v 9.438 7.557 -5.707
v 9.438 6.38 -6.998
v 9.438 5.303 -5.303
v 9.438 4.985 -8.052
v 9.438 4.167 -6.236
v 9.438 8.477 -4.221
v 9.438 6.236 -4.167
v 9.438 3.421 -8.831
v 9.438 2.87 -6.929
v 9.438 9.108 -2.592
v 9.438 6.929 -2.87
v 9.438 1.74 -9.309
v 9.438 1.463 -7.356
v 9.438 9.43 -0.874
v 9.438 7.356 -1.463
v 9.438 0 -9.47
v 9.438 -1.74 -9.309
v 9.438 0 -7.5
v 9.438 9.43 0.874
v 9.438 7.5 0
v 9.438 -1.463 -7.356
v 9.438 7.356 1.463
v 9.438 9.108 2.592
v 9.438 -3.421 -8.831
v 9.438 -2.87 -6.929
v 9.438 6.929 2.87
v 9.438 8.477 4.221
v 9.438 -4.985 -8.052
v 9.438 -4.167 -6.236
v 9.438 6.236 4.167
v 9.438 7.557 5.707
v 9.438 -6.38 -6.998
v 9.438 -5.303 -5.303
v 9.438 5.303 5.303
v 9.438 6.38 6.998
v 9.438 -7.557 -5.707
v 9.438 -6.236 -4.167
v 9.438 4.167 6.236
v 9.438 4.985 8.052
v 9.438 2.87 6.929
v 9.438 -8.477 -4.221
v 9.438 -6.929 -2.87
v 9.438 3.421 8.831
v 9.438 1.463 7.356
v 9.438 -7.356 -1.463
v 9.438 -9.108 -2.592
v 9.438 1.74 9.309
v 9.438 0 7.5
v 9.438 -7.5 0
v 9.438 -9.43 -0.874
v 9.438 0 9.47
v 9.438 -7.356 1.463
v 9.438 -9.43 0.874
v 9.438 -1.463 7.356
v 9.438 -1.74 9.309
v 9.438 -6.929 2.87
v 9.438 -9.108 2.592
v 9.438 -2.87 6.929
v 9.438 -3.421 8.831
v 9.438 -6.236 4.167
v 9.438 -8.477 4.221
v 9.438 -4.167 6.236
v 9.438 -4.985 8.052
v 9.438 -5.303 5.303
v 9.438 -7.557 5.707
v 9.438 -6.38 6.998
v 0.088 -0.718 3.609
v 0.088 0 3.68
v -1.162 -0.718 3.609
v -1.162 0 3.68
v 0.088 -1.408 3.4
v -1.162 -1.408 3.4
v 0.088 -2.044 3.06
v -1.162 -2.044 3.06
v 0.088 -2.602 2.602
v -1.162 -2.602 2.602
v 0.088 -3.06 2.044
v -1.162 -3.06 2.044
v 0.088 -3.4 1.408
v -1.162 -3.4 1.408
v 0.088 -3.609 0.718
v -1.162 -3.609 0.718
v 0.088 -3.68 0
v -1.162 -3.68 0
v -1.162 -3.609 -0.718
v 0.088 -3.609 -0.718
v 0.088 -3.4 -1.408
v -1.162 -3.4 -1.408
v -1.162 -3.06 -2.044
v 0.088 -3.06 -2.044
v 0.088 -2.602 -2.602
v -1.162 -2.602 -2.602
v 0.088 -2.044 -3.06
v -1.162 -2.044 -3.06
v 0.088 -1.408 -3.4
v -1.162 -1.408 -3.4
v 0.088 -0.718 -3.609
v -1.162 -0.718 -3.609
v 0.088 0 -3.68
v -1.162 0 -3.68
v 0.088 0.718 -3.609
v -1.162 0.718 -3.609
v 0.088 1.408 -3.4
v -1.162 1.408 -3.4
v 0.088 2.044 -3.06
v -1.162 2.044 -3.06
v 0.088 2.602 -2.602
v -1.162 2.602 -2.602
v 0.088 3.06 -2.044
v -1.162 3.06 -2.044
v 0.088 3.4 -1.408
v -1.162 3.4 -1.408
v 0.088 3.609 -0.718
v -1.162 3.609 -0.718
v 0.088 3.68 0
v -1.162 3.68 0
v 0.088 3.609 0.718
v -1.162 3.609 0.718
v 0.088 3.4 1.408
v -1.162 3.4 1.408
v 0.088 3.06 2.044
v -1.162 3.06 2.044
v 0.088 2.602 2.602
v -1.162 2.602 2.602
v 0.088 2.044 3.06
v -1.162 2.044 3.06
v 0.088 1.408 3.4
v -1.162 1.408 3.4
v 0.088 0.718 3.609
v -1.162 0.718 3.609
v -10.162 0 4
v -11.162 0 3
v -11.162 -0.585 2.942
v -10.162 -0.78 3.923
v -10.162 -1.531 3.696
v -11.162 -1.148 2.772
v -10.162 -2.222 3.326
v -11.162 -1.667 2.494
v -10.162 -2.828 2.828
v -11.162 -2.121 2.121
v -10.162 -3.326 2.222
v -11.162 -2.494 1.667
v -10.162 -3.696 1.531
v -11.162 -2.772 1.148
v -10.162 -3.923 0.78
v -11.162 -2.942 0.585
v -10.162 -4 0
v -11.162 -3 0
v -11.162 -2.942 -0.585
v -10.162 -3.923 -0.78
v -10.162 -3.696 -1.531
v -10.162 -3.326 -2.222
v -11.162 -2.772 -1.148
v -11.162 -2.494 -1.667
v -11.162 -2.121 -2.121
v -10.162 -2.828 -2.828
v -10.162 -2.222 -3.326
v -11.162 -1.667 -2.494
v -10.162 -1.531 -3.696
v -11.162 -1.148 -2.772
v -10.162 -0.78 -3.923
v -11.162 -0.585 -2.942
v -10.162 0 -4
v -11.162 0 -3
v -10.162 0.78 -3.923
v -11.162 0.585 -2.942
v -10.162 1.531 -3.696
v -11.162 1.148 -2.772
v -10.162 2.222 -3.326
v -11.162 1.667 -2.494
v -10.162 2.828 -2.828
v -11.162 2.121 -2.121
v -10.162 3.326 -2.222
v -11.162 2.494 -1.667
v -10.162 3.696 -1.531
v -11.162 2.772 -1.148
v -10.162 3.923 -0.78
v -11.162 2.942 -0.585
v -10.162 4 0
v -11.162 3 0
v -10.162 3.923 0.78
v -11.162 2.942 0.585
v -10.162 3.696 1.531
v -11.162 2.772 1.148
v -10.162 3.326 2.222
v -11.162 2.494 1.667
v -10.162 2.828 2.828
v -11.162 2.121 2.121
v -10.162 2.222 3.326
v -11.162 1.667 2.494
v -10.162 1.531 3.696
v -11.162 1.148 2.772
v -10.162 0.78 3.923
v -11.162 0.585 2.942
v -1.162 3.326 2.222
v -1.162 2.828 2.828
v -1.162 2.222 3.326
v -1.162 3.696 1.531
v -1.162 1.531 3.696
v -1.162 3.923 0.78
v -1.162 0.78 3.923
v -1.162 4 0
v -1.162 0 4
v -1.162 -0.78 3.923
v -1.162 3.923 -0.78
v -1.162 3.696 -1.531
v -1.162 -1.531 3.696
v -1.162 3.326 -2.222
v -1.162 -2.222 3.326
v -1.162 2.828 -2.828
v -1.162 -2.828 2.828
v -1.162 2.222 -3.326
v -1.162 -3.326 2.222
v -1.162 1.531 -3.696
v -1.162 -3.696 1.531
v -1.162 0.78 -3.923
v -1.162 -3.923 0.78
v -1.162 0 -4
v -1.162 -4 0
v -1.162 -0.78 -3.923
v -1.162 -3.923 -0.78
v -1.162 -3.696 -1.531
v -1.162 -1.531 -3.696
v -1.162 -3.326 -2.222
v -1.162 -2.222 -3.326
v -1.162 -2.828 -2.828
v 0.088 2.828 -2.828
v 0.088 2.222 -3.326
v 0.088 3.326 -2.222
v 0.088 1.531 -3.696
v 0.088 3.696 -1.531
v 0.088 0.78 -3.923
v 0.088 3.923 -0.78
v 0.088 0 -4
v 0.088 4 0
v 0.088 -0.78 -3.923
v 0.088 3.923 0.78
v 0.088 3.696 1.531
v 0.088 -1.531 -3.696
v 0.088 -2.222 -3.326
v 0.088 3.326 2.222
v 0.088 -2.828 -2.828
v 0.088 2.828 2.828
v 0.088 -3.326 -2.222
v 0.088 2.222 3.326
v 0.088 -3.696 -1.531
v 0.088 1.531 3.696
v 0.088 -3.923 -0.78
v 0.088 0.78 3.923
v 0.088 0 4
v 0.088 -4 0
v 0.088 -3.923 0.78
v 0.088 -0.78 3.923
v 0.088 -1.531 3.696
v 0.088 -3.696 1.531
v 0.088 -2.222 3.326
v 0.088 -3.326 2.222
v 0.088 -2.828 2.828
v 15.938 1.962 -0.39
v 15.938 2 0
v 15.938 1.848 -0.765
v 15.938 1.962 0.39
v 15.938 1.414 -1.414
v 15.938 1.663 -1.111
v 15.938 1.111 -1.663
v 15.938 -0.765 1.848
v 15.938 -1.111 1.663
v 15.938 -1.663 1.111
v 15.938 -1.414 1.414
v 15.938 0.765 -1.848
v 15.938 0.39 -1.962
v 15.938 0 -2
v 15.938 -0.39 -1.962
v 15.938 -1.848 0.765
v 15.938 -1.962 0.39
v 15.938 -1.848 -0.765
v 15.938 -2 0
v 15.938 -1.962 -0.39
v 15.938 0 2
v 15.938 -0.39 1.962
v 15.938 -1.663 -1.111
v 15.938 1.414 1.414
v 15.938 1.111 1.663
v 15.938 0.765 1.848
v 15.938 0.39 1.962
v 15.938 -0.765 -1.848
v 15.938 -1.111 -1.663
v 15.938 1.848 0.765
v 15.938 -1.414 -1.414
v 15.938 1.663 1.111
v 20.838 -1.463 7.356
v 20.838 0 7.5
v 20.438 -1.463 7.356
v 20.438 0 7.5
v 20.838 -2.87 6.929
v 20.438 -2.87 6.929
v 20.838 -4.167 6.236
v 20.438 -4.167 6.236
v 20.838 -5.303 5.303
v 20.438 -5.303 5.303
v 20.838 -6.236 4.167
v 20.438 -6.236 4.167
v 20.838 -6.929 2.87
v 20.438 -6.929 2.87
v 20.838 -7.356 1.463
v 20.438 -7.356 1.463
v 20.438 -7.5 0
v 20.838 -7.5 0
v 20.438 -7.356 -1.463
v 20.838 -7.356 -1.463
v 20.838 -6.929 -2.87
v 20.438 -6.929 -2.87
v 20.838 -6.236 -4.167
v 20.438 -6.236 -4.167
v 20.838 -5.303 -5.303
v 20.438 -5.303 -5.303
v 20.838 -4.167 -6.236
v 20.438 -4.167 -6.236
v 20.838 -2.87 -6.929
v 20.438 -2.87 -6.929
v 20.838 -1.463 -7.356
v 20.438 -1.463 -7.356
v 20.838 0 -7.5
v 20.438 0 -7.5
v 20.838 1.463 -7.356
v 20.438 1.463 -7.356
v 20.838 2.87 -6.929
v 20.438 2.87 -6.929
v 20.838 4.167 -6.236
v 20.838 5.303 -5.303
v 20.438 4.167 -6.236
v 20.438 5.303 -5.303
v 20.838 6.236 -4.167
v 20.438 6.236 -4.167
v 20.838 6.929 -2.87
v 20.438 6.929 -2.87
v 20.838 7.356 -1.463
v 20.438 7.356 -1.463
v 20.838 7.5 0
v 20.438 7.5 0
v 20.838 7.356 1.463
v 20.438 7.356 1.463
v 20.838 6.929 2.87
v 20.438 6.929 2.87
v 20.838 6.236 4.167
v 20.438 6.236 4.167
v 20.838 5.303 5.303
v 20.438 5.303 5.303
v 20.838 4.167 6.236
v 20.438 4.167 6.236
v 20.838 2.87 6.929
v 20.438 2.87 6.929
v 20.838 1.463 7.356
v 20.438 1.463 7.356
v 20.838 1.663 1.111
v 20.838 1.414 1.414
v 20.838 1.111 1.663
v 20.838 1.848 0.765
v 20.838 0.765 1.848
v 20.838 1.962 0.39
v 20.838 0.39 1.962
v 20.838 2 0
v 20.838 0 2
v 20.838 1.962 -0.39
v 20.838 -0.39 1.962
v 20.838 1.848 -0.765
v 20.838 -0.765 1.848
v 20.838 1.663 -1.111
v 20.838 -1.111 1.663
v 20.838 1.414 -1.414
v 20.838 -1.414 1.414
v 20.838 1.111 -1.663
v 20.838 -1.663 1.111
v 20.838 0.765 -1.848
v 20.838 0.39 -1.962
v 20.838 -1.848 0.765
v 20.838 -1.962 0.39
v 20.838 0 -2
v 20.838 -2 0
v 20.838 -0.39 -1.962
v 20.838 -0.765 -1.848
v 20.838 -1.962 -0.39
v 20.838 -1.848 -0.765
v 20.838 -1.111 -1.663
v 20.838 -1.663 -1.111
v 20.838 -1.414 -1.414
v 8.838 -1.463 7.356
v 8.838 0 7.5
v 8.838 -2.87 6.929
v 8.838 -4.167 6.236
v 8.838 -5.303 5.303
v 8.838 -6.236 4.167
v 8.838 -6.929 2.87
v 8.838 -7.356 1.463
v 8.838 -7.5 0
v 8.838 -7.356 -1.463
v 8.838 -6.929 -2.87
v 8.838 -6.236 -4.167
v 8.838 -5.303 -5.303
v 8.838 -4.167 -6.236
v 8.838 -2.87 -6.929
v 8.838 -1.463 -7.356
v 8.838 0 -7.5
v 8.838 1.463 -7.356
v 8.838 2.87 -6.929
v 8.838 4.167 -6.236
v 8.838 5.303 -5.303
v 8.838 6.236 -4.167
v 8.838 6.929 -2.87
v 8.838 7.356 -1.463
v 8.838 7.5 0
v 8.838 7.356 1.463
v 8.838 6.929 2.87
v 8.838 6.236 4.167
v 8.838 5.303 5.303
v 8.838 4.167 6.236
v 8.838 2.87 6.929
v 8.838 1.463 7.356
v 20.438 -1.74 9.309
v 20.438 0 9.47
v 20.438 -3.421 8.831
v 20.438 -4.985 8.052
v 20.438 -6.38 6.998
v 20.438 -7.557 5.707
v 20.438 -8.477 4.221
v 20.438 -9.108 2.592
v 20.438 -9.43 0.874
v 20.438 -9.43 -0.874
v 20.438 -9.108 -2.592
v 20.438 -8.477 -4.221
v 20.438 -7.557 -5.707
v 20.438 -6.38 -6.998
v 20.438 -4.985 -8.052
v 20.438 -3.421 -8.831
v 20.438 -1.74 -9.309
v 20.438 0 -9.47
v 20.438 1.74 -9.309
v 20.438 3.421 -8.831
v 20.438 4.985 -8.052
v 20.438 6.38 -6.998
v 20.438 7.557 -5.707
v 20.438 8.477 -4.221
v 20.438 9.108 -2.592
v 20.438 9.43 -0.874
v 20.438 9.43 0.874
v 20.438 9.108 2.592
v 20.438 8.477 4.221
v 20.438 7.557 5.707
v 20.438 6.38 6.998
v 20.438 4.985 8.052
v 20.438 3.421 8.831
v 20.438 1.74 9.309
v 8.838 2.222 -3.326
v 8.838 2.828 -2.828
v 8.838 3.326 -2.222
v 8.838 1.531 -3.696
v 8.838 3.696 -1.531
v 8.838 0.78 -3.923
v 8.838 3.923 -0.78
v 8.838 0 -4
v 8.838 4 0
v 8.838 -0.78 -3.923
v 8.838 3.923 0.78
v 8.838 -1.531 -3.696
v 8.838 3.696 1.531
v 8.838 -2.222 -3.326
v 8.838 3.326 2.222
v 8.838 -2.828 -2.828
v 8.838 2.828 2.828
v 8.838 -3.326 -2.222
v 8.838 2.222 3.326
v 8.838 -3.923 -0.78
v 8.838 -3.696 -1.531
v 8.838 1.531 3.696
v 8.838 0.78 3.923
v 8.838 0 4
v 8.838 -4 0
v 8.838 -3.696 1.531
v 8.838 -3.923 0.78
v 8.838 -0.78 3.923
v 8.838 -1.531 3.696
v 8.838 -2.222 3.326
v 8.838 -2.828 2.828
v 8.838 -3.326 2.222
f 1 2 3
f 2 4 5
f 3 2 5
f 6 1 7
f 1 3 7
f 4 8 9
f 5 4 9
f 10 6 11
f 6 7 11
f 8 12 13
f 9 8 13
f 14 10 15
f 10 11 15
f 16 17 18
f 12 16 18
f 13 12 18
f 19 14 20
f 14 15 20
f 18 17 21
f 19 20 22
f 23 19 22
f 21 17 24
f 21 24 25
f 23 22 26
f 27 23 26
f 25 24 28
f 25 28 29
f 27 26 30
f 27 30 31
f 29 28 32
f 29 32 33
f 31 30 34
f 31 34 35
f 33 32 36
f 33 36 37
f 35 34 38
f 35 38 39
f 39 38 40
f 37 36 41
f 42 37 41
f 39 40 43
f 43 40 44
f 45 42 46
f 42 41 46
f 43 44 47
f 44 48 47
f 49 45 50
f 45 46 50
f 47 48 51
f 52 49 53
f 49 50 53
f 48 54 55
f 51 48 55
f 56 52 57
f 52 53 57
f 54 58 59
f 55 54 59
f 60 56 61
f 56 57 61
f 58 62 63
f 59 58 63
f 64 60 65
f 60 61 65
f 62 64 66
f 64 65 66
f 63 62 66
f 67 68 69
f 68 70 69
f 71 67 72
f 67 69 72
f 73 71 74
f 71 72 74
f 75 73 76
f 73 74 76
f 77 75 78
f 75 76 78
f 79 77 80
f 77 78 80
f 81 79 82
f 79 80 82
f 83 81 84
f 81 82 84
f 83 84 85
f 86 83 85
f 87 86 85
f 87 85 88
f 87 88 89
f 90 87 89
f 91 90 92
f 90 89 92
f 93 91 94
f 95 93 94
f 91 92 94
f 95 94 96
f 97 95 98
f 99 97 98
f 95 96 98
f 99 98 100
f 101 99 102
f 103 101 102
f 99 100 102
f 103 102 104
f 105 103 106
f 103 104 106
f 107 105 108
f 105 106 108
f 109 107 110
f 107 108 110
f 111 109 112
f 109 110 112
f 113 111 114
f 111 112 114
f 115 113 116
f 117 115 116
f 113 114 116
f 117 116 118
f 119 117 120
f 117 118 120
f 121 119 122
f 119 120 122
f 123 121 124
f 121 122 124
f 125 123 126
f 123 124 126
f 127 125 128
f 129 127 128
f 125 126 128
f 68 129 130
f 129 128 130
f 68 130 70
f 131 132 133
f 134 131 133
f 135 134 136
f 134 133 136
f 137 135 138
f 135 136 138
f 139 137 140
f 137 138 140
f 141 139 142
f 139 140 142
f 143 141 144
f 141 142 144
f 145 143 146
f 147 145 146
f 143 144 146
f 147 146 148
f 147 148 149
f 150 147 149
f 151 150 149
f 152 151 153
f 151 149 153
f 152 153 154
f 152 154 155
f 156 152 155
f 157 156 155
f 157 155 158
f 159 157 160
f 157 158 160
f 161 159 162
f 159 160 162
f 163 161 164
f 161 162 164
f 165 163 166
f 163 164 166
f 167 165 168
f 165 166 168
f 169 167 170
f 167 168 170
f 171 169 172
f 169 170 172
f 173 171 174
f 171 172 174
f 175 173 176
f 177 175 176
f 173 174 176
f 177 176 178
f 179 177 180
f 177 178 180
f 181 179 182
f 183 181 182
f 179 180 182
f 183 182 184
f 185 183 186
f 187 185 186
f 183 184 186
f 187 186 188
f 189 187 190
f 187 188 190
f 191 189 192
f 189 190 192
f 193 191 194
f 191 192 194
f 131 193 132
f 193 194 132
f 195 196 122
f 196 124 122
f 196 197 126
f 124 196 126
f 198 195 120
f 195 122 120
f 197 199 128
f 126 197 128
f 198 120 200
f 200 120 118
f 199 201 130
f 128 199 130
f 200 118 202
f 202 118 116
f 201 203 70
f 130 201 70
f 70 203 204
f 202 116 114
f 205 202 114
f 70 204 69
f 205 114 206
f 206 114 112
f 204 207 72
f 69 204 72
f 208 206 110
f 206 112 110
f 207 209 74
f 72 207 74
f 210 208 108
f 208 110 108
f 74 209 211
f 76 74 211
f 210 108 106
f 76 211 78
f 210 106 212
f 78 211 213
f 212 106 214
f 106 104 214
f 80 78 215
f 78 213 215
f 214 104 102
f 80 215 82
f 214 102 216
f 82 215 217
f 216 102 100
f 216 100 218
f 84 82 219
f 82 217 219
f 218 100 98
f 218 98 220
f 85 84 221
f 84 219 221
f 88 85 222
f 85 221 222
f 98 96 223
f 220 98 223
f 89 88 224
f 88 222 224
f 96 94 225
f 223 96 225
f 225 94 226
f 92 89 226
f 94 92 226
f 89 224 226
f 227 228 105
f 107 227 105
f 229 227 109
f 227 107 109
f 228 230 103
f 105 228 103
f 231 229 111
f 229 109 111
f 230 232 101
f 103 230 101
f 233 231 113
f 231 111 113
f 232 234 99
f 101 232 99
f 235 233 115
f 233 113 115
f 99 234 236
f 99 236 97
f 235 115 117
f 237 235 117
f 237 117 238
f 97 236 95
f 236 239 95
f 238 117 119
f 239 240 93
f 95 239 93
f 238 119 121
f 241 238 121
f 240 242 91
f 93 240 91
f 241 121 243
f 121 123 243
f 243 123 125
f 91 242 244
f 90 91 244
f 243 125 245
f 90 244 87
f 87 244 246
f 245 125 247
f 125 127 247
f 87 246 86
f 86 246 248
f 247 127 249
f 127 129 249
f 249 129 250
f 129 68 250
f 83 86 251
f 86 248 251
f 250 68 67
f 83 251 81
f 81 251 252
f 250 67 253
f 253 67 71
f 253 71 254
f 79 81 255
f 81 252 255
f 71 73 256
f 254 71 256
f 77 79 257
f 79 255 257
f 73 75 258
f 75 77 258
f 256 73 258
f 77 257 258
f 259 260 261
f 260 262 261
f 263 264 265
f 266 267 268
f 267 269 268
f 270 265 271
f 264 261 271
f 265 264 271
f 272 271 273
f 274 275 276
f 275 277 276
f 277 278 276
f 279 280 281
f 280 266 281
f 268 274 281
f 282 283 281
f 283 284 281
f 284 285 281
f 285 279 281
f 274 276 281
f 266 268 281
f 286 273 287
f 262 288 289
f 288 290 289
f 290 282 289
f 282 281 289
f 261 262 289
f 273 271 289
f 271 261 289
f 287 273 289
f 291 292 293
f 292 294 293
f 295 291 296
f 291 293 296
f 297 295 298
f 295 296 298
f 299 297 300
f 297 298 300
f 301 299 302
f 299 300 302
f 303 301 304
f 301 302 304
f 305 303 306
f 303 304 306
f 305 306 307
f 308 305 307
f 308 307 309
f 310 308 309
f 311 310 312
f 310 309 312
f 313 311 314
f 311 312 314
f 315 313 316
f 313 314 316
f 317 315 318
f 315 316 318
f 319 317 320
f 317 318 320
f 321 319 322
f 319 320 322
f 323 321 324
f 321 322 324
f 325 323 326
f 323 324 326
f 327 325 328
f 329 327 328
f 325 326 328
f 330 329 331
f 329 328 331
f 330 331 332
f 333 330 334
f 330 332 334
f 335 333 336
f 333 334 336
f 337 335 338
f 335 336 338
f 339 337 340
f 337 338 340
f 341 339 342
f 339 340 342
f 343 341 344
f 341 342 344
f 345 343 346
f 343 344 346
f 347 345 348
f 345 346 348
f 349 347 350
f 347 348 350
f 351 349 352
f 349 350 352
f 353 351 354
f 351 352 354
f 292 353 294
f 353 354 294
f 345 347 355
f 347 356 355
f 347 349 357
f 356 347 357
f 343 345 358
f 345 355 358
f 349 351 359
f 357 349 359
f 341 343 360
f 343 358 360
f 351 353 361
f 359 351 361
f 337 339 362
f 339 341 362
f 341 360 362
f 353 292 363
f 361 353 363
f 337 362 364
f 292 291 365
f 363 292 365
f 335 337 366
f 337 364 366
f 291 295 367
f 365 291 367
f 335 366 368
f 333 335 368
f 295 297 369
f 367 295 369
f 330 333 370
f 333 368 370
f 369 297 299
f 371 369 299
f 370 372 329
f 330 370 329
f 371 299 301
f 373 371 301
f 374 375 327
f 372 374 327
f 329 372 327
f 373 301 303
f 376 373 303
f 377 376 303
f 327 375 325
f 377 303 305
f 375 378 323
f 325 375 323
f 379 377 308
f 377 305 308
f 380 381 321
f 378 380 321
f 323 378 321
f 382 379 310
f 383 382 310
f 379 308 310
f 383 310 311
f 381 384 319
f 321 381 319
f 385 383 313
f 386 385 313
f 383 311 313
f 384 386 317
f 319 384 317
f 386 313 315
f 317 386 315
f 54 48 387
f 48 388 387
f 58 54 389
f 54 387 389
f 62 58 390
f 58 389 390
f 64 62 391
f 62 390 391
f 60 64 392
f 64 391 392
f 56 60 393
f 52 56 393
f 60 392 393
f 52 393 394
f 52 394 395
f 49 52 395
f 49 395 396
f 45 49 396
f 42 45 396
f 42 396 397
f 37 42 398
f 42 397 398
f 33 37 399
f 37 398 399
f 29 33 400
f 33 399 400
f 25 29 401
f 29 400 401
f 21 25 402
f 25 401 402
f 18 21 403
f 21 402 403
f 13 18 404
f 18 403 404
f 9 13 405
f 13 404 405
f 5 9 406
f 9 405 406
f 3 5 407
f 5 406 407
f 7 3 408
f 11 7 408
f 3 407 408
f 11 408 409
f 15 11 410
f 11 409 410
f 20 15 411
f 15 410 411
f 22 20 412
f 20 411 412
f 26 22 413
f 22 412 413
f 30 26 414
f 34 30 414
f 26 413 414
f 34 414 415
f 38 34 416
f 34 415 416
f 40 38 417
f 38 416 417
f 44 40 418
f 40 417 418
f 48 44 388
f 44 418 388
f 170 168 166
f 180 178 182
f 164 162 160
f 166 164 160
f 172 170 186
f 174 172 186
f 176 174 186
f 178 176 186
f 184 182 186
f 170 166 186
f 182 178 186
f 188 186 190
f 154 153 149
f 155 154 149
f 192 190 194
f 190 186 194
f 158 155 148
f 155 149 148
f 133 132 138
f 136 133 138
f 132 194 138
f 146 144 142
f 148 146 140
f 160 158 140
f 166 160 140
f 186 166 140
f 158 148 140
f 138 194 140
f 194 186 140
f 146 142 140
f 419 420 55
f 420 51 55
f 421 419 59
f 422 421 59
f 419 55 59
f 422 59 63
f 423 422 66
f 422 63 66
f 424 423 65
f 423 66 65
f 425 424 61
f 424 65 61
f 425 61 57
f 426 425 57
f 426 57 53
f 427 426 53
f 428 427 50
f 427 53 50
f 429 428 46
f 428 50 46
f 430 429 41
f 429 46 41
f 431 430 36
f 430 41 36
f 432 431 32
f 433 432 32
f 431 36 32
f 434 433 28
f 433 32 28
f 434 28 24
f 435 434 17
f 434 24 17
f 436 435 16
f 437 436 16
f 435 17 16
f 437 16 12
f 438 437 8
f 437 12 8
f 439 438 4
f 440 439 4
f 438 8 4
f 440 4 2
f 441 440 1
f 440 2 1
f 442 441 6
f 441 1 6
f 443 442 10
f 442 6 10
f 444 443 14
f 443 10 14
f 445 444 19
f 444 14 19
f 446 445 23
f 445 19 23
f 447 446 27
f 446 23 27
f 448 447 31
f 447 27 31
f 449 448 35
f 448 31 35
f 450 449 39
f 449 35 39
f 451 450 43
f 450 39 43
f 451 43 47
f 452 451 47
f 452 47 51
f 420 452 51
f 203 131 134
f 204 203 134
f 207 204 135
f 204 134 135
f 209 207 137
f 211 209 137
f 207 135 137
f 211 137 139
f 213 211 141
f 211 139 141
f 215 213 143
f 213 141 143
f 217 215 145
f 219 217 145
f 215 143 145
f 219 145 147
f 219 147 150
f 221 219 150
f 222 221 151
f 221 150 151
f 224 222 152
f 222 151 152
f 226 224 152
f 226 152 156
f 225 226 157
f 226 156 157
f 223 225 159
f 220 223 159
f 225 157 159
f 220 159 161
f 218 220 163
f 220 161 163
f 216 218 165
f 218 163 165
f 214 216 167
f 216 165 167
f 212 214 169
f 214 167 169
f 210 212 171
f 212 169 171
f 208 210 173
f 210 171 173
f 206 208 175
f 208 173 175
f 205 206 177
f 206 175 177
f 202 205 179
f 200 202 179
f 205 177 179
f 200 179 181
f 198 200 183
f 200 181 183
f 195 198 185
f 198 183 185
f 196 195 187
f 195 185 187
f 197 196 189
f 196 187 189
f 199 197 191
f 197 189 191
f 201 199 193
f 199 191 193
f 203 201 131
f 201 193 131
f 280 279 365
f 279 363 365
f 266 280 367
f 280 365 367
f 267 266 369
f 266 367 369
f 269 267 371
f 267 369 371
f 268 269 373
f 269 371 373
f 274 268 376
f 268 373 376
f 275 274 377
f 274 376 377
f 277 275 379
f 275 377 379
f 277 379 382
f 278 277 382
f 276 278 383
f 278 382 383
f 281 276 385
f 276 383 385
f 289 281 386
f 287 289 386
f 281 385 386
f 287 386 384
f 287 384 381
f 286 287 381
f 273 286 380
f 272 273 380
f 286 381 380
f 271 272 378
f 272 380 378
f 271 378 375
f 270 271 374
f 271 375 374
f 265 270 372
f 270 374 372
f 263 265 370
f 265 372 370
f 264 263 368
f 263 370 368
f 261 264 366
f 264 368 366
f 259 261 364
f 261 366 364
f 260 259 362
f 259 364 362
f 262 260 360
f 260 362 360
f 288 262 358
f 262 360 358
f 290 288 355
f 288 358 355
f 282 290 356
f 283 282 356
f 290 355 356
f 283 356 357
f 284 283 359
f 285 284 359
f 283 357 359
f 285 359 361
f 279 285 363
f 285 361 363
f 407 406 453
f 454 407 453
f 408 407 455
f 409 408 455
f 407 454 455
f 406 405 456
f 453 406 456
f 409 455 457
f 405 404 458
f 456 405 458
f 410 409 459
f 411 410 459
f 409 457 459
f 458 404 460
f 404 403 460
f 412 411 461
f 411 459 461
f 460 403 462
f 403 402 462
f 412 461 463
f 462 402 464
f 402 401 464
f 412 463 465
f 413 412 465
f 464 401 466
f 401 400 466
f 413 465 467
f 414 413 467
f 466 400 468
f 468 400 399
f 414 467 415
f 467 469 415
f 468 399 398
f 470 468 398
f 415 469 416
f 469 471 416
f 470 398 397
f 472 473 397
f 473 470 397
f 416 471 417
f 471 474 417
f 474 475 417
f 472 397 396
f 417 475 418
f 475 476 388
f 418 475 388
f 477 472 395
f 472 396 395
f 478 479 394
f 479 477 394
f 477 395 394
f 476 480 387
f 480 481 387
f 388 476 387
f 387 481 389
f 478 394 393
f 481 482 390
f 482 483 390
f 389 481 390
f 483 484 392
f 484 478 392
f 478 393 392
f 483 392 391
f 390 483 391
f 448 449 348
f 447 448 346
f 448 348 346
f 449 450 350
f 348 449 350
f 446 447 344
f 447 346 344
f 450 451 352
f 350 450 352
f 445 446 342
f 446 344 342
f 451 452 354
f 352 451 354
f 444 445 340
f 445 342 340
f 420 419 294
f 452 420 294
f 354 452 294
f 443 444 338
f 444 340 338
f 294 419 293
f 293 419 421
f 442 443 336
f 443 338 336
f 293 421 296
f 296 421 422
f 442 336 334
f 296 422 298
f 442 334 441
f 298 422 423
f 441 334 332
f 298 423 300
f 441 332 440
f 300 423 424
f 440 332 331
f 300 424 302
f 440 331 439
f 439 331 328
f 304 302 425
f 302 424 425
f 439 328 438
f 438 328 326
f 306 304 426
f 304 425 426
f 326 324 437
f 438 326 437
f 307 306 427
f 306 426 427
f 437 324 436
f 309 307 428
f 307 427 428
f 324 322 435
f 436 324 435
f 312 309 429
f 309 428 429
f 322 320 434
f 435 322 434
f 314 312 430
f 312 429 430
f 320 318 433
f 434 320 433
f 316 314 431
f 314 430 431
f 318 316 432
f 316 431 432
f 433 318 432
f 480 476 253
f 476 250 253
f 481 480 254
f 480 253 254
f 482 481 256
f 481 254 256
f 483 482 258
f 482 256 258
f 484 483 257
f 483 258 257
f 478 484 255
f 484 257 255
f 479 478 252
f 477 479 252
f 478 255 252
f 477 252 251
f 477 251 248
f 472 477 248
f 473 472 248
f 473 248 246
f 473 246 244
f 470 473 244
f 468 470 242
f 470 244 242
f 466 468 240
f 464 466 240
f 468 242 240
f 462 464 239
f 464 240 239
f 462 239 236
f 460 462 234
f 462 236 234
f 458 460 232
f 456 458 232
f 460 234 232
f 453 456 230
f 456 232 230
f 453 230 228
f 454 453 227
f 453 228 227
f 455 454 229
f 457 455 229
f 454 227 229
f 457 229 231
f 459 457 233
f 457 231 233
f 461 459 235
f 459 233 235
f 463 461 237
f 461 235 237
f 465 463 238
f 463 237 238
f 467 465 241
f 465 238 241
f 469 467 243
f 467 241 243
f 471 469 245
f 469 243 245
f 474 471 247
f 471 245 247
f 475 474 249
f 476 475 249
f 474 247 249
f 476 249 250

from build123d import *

# Parameters (mm, degrees)
SMUSSO1_SIZE = 1


with BuildPart() as part:
    # Schizzo1 → Rivoluzione1 (revolve)
    with BuildSketch(Plane.XY, mode=Mode.PRIVATE) as rivoluzione1_sk:
        Polygon((15.938425382, 0), (15.938425382, 2), (20.838425382, 2), (20.838425382, 7.5), (20.438425382, 7.5), (20.438425382, 9.47), (9.438425382, 9.47), (9.438425382, 7.5), (8.838425382, 7.5), (8.838425382, 4), (0.088425382, 4), (0.088425382, 3.68), (-1.161574618, 3.68), (-1.161574618, 4), (-11.161574618, 4), (-11.161574618, 0), align=None)
    revolve(rivoluzione1_sk.sketch.rotate(Axis((-12.465922444, 0, 0), (1, 0, 0)), 90), axis=Axis((-12.465922444, 0, 0), (1, 0, 0)))

    # Smusso1
    smusso1_edges = [part.edges().sort_by_distance(p)[0] for p in [
        (-11.161574618, 0, -4),
    ]]
    chamfer(smusso1_edges, length=SMUSSO1_SIZE)


solid = part.part
